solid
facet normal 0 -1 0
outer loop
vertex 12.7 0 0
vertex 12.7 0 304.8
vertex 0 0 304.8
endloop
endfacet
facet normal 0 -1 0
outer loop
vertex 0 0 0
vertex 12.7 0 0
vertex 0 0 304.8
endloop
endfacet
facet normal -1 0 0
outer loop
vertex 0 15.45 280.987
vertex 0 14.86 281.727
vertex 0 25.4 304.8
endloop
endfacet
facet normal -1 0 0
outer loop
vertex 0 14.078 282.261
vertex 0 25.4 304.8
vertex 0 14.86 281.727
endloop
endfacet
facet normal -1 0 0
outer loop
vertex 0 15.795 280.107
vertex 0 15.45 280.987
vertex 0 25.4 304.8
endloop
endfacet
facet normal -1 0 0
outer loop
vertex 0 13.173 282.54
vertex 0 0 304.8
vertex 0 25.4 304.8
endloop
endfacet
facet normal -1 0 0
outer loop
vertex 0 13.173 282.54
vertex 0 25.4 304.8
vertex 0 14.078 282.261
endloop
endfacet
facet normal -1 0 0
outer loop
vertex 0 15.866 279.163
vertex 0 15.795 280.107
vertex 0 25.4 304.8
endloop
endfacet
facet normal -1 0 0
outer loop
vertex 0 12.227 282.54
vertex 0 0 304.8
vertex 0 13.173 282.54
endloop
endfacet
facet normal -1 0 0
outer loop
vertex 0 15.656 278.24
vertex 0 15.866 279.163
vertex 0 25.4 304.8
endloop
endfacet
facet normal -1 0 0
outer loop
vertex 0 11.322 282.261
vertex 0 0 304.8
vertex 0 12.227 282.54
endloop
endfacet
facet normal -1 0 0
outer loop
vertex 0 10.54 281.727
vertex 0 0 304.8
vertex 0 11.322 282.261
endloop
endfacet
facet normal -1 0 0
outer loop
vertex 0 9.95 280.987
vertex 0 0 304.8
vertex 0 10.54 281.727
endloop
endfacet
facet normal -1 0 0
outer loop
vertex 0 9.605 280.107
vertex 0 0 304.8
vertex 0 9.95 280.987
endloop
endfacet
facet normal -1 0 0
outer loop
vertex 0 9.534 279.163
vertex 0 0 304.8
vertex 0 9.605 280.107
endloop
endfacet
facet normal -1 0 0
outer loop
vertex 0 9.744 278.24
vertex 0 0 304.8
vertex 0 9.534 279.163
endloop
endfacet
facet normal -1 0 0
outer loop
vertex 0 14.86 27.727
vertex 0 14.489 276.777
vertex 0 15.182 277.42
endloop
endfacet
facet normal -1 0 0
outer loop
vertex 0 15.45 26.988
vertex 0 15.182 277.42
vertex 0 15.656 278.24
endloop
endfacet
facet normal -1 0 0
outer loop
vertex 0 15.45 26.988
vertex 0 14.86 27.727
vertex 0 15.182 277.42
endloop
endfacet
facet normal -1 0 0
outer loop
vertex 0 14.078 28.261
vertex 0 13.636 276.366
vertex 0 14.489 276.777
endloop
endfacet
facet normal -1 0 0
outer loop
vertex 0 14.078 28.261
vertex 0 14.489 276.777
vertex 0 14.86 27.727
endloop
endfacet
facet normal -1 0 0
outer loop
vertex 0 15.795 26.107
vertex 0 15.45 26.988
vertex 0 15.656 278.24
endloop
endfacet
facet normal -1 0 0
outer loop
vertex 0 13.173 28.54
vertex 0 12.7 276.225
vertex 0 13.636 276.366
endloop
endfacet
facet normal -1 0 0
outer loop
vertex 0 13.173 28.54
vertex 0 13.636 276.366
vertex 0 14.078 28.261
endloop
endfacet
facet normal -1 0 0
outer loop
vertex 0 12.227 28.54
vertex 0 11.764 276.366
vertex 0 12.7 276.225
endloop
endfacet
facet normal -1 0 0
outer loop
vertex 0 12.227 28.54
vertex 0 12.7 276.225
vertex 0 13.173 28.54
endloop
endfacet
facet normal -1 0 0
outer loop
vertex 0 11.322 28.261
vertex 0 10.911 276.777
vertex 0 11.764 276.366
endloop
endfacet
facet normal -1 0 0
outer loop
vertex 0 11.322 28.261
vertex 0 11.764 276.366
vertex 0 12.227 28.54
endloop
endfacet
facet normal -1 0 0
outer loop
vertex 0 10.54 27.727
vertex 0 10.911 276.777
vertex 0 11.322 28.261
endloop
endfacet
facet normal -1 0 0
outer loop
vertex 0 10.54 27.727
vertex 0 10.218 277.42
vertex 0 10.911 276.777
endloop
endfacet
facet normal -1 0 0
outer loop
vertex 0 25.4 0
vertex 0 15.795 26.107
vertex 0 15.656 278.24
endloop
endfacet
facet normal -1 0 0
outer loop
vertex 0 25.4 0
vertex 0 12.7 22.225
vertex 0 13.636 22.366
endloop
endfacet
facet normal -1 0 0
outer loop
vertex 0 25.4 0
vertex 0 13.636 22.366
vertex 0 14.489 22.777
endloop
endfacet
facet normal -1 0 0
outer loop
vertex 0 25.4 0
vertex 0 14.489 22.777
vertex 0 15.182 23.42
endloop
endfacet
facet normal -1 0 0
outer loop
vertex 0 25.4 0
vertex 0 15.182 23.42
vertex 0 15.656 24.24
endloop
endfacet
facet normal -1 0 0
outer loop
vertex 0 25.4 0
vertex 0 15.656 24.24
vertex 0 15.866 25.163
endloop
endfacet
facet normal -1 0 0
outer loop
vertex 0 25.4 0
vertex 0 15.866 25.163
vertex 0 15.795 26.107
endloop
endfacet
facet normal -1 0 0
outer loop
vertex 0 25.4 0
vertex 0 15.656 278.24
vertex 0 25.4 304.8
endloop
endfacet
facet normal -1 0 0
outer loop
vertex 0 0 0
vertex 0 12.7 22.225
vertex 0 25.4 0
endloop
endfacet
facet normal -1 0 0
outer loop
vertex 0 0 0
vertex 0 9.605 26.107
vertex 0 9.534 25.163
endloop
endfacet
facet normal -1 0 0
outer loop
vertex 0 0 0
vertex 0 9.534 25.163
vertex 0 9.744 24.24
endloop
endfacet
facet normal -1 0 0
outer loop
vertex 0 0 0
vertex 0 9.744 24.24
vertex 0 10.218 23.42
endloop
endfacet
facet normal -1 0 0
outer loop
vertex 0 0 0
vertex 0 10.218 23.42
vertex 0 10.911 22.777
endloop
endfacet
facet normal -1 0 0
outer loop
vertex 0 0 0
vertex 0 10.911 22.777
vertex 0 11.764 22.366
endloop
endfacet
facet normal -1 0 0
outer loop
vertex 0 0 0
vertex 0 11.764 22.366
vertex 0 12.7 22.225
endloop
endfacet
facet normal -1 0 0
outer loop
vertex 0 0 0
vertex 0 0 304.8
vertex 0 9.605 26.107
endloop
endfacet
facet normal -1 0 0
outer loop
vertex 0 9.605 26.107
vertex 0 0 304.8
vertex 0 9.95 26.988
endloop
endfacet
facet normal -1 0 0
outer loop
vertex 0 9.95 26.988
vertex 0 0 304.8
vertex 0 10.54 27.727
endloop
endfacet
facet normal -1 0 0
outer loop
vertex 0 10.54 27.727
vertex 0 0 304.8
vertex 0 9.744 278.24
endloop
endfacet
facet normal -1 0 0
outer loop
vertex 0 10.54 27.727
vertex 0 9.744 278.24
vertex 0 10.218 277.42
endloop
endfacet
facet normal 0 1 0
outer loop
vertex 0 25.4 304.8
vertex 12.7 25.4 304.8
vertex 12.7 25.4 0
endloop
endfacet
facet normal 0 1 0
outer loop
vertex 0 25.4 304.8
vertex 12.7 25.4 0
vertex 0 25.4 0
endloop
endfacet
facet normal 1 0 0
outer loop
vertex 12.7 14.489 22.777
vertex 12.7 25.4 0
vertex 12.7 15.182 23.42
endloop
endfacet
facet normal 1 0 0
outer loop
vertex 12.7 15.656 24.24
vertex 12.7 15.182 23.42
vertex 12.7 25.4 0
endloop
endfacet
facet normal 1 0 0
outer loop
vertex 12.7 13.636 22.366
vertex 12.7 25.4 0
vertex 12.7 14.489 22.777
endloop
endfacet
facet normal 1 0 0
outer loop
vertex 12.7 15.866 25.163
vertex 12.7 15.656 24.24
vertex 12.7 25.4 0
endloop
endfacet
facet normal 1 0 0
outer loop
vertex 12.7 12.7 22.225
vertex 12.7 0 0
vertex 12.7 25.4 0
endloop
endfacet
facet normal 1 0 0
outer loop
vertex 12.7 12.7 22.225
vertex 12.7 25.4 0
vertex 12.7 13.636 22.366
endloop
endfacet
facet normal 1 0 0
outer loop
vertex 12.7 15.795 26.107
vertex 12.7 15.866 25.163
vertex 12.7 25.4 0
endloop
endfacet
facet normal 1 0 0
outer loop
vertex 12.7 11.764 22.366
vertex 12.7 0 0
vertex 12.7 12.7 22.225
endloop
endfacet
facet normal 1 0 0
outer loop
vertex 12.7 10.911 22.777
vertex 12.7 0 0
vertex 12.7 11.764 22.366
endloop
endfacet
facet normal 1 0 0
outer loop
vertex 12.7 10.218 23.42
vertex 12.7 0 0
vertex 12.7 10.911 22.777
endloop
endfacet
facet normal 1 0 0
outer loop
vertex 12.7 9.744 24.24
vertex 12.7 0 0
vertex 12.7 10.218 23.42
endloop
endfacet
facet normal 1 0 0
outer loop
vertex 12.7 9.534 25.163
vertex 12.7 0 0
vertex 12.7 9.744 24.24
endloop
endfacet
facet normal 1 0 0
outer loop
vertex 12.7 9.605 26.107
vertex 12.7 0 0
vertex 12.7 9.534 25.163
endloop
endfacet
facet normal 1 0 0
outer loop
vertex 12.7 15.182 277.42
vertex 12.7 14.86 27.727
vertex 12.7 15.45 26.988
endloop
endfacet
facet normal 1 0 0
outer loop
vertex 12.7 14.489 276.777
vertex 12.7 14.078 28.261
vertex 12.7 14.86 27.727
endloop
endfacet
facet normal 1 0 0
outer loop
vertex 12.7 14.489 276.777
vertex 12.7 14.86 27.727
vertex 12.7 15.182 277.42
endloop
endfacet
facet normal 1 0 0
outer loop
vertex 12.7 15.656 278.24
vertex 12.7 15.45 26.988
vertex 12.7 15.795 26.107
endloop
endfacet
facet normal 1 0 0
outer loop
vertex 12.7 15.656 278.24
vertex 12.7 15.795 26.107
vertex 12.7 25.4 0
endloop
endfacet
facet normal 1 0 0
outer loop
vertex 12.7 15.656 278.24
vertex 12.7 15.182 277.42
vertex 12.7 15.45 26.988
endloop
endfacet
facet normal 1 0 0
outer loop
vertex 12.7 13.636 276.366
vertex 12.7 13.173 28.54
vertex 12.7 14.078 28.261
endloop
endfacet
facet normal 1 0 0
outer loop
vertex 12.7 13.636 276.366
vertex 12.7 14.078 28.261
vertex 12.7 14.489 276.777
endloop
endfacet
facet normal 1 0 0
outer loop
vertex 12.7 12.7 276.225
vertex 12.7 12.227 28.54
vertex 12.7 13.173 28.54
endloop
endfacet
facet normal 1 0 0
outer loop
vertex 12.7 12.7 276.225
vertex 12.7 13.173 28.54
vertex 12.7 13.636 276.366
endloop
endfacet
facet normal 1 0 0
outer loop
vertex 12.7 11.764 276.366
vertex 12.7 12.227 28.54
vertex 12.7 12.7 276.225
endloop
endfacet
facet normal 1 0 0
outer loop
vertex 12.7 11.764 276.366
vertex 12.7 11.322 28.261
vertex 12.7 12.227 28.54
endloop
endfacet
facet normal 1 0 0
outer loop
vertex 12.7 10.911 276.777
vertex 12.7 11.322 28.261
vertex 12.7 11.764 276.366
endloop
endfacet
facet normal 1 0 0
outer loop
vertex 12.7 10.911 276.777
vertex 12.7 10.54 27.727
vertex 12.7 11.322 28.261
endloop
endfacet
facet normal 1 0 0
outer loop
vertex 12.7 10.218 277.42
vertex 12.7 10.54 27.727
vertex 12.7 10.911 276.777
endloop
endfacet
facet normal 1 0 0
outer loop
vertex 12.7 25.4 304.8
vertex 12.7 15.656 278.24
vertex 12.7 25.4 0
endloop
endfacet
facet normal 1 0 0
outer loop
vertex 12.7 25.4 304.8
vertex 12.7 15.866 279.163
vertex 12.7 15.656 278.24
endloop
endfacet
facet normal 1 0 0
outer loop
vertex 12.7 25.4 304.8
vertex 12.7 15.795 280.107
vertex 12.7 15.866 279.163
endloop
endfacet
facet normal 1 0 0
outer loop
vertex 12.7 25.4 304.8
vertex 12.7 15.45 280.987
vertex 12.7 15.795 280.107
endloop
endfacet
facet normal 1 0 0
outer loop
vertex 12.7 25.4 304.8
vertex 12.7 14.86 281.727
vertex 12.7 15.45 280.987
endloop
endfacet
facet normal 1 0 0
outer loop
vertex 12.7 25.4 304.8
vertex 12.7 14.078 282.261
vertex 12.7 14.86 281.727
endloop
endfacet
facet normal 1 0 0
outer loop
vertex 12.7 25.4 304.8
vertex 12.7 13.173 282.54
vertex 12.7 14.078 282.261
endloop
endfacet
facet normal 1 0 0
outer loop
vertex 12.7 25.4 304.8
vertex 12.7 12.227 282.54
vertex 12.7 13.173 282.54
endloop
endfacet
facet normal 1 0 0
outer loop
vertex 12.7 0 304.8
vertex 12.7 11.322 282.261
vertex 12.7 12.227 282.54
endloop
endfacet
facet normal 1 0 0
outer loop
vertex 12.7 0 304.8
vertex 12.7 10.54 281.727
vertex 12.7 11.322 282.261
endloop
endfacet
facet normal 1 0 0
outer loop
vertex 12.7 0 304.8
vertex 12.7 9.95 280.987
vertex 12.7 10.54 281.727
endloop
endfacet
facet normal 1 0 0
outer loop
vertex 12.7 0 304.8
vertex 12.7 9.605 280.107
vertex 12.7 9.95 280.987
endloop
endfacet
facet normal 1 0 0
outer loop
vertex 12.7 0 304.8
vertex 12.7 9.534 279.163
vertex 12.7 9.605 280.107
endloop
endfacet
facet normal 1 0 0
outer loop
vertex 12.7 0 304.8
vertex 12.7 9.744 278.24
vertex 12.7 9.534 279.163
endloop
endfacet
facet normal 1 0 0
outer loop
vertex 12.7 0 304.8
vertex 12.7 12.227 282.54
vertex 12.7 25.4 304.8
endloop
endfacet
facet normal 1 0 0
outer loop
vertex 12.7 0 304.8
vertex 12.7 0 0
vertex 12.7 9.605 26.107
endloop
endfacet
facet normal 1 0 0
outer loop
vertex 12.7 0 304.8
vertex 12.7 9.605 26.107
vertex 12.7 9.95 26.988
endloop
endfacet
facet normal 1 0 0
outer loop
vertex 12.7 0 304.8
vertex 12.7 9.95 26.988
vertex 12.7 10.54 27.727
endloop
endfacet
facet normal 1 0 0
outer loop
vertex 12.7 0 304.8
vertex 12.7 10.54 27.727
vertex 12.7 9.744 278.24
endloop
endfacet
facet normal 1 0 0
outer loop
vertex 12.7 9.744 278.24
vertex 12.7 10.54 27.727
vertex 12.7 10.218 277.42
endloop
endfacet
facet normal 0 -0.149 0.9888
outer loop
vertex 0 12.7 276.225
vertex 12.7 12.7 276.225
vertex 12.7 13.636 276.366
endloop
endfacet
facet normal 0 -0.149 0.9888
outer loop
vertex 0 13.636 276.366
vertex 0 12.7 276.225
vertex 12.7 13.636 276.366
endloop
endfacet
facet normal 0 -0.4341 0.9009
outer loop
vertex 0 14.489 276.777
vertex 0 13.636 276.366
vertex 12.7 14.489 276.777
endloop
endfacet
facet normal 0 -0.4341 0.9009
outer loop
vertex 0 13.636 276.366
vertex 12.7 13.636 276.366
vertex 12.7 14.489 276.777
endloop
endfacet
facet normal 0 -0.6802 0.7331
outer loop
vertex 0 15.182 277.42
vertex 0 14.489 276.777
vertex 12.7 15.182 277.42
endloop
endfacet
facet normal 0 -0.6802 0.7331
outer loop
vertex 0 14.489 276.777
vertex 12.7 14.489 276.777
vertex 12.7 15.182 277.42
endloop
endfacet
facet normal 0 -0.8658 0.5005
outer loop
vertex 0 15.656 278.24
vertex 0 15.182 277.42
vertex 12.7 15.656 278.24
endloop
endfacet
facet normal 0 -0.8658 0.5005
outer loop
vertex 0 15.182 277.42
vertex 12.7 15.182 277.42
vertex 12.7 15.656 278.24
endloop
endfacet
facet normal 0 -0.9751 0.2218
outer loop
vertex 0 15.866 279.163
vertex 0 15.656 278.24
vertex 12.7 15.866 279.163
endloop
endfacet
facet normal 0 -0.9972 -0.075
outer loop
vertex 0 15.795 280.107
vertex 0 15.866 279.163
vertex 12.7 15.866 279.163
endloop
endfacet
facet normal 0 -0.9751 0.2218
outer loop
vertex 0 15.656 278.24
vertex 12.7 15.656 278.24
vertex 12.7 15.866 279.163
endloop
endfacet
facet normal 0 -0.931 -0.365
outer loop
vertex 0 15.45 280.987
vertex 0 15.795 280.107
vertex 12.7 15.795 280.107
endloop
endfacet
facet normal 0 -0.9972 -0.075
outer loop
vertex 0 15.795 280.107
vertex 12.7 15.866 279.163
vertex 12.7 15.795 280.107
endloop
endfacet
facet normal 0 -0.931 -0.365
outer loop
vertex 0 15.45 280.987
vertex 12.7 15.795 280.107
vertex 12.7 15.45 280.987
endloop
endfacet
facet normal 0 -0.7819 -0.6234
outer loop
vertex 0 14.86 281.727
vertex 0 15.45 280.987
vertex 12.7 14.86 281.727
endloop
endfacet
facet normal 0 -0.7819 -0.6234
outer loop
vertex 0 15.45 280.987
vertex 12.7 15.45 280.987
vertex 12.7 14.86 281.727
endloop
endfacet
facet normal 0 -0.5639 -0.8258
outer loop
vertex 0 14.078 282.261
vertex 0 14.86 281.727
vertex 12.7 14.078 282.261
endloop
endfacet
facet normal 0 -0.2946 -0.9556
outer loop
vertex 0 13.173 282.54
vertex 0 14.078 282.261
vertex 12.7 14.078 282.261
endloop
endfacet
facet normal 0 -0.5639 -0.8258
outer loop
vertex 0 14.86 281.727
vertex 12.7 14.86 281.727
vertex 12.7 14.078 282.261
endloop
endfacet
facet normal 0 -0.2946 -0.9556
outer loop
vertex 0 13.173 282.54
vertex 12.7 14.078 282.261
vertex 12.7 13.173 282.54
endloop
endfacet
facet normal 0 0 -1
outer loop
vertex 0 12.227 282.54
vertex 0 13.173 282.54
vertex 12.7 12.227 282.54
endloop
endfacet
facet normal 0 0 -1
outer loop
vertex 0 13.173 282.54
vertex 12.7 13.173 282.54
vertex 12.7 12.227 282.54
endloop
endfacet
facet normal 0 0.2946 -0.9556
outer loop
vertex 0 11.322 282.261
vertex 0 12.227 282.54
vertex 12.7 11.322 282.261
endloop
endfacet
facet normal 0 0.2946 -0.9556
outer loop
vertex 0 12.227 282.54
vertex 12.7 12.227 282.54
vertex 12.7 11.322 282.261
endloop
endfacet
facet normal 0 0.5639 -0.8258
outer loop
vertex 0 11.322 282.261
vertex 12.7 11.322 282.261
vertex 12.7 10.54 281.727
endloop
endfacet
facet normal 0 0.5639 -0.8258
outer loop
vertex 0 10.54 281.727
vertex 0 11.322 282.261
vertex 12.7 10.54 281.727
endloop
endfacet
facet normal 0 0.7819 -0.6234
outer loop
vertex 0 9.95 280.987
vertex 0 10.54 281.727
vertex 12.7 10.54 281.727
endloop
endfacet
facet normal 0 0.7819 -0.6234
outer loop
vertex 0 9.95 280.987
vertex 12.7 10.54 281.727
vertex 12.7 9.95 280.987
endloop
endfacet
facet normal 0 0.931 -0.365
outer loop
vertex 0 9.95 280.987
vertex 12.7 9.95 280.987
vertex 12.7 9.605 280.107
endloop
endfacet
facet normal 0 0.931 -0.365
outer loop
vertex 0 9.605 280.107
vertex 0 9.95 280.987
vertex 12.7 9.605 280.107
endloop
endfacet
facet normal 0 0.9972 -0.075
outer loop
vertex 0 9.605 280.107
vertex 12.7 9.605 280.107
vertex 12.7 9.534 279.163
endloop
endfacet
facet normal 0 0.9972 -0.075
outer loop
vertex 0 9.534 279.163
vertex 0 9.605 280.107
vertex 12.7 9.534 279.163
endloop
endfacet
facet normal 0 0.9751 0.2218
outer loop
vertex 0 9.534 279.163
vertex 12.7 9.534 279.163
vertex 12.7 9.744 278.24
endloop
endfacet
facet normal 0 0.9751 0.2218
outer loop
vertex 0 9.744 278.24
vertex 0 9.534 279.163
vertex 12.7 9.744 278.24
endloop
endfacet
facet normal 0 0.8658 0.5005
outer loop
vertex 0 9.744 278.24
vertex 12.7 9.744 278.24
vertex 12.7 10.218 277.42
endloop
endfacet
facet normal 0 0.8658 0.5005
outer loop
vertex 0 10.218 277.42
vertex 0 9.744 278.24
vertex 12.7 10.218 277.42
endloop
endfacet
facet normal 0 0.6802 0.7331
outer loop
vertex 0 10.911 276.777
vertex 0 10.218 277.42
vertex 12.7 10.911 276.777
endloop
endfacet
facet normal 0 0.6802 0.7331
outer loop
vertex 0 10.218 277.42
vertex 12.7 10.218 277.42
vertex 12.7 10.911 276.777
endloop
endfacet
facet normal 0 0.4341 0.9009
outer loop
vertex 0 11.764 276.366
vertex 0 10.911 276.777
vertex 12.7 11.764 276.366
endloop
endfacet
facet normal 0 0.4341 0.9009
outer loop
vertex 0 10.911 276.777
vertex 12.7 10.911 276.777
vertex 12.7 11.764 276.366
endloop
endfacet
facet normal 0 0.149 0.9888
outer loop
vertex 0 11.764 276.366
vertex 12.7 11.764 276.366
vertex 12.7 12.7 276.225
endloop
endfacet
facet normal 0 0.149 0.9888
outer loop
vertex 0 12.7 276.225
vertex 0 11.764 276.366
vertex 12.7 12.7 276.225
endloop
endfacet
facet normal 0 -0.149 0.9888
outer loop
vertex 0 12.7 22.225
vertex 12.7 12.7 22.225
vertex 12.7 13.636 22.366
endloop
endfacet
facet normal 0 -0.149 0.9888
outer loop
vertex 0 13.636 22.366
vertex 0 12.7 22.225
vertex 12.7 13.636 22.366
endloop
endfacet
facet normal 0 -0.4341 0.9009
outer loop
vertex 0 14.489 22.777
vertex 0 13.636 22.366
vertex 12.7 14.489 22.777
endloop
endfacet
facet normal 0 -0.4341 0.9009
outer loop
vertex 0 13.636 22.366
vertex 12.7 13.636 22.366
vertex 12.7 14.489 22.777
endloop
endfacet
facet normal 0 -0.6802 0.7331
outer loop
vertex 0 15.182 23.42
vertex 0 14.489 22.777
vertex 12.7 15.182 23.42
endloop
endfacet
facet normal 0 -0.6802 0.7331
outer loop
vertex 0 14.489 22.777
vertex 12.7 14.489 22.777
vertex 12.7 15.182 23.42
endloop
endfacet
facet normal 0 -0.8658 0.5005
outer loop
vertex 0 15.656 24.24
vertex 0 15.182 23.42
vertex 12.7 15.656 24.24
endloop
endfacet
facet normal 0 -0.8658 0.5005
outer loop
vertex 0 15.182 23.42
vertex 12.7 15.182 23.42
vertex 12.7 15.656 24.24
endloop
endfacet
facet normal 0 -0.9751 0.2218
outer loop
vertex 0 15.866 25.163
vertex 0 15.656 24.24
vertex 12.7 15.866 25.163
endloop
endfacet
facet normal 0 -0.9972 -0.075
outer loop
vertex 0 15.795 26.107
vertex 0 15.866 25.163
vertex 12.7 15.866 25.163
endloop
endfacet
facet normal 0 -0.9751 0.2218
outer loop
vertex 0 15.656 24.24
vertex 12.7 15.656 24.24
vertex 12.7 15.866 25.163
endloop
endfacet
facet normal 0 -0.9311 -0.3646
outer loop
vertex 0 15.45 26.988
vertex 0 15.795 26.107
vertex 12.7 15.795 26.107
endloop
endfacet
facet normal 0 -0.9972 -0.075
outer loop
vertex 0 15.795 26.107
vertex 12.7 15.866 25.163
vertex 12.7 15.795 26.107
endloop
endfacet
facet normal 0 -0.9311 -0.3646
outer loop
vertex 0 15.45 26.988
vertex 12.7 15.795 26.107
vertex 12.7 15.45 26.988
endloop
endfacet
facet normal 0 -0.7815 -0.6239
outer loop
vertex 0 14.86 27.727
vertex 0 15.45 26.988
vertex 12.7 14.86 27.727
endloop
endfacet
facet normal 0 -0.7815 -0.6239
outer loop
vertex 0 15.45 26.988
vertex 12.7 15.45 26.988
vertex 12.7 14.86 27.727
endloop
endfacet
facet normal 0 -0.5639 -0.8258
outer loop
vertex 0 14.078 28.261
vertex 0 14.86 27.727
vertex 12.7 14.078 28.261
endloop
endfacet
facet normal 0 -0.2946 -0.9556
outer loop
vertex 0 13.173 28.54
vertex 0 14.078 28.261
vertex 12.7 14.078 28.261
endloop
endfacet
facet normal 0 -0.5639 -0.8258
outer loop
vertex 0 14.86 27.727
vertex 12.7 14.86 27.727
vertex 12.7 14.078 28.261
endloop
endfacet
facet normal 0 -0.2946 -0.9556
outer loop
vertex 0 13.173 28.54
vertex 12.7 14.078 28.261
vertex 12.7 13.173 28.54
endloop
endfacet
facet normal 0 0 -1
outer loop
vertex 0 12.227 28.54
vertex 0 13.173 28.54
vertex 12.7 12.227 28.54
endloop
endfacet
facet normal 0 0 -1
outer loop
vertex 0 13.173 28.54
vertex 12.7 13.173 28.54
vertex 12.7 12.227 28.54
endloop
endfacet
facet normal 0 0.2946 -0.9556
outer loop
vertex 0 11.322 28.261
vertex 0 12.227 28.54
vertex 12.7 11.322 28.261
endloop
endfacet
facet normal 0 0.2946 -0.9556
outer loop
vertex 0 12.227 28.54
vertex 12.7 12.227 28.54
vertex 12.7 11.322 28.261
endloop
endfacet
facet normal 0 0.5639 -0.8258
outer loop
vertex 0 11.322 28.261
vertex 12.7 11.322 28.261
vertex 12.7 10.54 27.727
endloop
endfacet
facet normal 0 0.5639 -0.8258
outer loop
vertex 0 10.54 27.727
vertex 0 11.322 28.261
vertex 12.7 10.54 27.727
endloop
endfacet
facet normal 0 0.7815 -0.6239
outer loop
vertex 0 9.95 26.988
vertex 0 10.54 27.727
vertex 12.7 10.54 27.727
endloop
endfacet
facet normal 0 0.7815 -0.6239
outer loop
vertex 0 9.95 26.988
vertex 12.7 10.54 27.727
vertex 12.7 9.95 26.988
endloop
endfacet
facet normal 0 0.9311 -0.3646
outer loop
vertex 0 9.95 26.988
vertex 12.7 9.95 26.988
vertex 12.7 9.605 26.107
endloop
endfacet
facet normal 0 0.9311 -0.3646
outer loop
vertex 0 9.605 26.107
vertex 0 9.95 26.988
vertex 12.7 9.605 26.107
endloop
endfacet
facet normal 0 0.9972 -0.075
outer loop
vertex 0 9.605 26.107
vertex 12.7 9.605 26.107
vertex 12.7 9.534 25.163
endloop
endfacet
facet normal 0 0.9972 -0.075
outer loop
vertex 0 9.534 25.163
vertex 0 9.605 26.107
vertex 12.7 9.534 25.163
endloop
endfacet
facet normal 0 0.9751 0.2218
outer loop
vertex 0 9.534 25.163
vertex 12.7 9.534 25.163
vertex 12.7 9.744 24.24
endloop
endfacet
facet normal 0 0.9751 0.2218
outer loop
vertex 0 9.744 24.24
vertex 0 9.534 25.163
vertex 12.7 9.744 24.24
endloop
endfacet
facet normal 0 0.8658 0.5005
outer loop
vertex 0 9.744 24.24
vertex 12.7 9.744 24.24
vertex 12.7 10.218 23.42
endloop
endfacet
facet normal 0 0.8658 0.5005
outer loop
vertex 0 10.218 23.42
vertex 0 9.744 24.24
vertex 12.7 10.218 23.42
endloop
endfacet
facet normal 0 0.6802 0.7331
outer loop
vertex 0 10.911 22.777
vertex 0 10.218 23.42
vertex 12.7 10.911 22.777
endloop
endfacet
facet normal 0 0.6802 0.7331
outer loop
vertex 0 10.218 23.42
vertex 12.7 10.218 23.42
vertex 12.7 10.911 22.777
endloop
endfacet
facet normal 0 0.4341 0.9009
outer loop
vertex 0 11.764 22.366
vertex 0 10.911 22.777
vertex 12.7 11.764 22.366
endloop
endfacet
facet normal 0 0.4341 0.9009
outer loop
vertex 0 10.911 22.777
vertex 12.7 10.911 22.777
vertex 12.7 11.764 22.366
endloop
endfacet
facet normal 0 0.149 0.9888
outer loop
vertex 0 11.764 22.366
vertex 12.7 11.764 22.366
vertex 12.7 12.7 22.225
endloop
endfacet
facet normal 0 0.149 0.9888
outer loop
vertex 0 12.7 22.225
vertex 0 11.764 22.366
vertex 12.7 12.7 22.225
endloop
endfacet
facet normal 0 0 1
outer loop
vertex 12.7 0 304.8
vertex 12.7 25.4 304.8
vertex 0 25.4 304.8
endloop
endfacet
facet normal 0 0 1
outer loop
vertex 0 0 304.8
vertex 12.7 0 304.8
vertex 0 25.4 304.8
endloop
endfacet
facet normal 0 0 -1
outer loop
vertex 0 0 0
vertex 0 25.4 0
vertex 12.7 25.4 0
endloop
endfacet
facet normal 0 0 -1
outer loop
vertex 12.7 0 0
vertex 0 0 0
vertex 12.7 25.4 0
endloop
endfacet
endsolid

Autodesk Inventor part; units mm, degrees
ref_plane "YZ Plane" through (0, 0, 0) normal (1, 0, 0) x (0, 1, 0)
ref_plane "XZ Plane" through (0, 0, 0) normal (0, 1, 0) x (-1, 0, 0)
ref_plane "XY Plane" through (0, 0, 0) normal (0, 0, 1) x (1, 0, 0)
sketch "Sketch1" plane through (0, 0, 0) normal (0, 1, 0) x (-1, 0, 0)
  line L0 (0, 0) -> (-12.7, 0)
  line L1 (-12.7, 0) -> (-12.7, 304.8)
  line L2 (-12.7, 304.8) -> (0, 304.8)
  line L3 (0, 304.8) -> (0, 0)
  dimension "d0" = 304.8
  dimension "d1" = 12.7
extrude "Extrusion1" add sketch "Sketch1" along normal blind 25.4
sketch "Sketch2" plane through (12.7, 0, 304.8) normal (1, 0, 0) x (0, 0, -1)
  circle A0 centre (279.4, 12.7) radius 3.175
  line L0 (304.8, 0) -> (304.8, 25.4) projected
  line L1 (0, 25.4) -> (304.8, 25.4) projected
  circle A1 centre (25.4, 12.7) radius 3.175
  line L2 (0, 0) -> (0, 25.4) projected
  line L3 (304.8, 0) -> (0, 0) projected
  dimension "d4" = 6.35
  dimension "d5" = 25.4
  dimension "d6" = 12.7
  dimension "d7" = 6.35
  dimension "d8" = 25.4
  dimension "d9" = 12.7
extrude "Extrusion2" cut sketch "Sketch2" against normal through all contours A0 | A1
properties part number "arm3"
